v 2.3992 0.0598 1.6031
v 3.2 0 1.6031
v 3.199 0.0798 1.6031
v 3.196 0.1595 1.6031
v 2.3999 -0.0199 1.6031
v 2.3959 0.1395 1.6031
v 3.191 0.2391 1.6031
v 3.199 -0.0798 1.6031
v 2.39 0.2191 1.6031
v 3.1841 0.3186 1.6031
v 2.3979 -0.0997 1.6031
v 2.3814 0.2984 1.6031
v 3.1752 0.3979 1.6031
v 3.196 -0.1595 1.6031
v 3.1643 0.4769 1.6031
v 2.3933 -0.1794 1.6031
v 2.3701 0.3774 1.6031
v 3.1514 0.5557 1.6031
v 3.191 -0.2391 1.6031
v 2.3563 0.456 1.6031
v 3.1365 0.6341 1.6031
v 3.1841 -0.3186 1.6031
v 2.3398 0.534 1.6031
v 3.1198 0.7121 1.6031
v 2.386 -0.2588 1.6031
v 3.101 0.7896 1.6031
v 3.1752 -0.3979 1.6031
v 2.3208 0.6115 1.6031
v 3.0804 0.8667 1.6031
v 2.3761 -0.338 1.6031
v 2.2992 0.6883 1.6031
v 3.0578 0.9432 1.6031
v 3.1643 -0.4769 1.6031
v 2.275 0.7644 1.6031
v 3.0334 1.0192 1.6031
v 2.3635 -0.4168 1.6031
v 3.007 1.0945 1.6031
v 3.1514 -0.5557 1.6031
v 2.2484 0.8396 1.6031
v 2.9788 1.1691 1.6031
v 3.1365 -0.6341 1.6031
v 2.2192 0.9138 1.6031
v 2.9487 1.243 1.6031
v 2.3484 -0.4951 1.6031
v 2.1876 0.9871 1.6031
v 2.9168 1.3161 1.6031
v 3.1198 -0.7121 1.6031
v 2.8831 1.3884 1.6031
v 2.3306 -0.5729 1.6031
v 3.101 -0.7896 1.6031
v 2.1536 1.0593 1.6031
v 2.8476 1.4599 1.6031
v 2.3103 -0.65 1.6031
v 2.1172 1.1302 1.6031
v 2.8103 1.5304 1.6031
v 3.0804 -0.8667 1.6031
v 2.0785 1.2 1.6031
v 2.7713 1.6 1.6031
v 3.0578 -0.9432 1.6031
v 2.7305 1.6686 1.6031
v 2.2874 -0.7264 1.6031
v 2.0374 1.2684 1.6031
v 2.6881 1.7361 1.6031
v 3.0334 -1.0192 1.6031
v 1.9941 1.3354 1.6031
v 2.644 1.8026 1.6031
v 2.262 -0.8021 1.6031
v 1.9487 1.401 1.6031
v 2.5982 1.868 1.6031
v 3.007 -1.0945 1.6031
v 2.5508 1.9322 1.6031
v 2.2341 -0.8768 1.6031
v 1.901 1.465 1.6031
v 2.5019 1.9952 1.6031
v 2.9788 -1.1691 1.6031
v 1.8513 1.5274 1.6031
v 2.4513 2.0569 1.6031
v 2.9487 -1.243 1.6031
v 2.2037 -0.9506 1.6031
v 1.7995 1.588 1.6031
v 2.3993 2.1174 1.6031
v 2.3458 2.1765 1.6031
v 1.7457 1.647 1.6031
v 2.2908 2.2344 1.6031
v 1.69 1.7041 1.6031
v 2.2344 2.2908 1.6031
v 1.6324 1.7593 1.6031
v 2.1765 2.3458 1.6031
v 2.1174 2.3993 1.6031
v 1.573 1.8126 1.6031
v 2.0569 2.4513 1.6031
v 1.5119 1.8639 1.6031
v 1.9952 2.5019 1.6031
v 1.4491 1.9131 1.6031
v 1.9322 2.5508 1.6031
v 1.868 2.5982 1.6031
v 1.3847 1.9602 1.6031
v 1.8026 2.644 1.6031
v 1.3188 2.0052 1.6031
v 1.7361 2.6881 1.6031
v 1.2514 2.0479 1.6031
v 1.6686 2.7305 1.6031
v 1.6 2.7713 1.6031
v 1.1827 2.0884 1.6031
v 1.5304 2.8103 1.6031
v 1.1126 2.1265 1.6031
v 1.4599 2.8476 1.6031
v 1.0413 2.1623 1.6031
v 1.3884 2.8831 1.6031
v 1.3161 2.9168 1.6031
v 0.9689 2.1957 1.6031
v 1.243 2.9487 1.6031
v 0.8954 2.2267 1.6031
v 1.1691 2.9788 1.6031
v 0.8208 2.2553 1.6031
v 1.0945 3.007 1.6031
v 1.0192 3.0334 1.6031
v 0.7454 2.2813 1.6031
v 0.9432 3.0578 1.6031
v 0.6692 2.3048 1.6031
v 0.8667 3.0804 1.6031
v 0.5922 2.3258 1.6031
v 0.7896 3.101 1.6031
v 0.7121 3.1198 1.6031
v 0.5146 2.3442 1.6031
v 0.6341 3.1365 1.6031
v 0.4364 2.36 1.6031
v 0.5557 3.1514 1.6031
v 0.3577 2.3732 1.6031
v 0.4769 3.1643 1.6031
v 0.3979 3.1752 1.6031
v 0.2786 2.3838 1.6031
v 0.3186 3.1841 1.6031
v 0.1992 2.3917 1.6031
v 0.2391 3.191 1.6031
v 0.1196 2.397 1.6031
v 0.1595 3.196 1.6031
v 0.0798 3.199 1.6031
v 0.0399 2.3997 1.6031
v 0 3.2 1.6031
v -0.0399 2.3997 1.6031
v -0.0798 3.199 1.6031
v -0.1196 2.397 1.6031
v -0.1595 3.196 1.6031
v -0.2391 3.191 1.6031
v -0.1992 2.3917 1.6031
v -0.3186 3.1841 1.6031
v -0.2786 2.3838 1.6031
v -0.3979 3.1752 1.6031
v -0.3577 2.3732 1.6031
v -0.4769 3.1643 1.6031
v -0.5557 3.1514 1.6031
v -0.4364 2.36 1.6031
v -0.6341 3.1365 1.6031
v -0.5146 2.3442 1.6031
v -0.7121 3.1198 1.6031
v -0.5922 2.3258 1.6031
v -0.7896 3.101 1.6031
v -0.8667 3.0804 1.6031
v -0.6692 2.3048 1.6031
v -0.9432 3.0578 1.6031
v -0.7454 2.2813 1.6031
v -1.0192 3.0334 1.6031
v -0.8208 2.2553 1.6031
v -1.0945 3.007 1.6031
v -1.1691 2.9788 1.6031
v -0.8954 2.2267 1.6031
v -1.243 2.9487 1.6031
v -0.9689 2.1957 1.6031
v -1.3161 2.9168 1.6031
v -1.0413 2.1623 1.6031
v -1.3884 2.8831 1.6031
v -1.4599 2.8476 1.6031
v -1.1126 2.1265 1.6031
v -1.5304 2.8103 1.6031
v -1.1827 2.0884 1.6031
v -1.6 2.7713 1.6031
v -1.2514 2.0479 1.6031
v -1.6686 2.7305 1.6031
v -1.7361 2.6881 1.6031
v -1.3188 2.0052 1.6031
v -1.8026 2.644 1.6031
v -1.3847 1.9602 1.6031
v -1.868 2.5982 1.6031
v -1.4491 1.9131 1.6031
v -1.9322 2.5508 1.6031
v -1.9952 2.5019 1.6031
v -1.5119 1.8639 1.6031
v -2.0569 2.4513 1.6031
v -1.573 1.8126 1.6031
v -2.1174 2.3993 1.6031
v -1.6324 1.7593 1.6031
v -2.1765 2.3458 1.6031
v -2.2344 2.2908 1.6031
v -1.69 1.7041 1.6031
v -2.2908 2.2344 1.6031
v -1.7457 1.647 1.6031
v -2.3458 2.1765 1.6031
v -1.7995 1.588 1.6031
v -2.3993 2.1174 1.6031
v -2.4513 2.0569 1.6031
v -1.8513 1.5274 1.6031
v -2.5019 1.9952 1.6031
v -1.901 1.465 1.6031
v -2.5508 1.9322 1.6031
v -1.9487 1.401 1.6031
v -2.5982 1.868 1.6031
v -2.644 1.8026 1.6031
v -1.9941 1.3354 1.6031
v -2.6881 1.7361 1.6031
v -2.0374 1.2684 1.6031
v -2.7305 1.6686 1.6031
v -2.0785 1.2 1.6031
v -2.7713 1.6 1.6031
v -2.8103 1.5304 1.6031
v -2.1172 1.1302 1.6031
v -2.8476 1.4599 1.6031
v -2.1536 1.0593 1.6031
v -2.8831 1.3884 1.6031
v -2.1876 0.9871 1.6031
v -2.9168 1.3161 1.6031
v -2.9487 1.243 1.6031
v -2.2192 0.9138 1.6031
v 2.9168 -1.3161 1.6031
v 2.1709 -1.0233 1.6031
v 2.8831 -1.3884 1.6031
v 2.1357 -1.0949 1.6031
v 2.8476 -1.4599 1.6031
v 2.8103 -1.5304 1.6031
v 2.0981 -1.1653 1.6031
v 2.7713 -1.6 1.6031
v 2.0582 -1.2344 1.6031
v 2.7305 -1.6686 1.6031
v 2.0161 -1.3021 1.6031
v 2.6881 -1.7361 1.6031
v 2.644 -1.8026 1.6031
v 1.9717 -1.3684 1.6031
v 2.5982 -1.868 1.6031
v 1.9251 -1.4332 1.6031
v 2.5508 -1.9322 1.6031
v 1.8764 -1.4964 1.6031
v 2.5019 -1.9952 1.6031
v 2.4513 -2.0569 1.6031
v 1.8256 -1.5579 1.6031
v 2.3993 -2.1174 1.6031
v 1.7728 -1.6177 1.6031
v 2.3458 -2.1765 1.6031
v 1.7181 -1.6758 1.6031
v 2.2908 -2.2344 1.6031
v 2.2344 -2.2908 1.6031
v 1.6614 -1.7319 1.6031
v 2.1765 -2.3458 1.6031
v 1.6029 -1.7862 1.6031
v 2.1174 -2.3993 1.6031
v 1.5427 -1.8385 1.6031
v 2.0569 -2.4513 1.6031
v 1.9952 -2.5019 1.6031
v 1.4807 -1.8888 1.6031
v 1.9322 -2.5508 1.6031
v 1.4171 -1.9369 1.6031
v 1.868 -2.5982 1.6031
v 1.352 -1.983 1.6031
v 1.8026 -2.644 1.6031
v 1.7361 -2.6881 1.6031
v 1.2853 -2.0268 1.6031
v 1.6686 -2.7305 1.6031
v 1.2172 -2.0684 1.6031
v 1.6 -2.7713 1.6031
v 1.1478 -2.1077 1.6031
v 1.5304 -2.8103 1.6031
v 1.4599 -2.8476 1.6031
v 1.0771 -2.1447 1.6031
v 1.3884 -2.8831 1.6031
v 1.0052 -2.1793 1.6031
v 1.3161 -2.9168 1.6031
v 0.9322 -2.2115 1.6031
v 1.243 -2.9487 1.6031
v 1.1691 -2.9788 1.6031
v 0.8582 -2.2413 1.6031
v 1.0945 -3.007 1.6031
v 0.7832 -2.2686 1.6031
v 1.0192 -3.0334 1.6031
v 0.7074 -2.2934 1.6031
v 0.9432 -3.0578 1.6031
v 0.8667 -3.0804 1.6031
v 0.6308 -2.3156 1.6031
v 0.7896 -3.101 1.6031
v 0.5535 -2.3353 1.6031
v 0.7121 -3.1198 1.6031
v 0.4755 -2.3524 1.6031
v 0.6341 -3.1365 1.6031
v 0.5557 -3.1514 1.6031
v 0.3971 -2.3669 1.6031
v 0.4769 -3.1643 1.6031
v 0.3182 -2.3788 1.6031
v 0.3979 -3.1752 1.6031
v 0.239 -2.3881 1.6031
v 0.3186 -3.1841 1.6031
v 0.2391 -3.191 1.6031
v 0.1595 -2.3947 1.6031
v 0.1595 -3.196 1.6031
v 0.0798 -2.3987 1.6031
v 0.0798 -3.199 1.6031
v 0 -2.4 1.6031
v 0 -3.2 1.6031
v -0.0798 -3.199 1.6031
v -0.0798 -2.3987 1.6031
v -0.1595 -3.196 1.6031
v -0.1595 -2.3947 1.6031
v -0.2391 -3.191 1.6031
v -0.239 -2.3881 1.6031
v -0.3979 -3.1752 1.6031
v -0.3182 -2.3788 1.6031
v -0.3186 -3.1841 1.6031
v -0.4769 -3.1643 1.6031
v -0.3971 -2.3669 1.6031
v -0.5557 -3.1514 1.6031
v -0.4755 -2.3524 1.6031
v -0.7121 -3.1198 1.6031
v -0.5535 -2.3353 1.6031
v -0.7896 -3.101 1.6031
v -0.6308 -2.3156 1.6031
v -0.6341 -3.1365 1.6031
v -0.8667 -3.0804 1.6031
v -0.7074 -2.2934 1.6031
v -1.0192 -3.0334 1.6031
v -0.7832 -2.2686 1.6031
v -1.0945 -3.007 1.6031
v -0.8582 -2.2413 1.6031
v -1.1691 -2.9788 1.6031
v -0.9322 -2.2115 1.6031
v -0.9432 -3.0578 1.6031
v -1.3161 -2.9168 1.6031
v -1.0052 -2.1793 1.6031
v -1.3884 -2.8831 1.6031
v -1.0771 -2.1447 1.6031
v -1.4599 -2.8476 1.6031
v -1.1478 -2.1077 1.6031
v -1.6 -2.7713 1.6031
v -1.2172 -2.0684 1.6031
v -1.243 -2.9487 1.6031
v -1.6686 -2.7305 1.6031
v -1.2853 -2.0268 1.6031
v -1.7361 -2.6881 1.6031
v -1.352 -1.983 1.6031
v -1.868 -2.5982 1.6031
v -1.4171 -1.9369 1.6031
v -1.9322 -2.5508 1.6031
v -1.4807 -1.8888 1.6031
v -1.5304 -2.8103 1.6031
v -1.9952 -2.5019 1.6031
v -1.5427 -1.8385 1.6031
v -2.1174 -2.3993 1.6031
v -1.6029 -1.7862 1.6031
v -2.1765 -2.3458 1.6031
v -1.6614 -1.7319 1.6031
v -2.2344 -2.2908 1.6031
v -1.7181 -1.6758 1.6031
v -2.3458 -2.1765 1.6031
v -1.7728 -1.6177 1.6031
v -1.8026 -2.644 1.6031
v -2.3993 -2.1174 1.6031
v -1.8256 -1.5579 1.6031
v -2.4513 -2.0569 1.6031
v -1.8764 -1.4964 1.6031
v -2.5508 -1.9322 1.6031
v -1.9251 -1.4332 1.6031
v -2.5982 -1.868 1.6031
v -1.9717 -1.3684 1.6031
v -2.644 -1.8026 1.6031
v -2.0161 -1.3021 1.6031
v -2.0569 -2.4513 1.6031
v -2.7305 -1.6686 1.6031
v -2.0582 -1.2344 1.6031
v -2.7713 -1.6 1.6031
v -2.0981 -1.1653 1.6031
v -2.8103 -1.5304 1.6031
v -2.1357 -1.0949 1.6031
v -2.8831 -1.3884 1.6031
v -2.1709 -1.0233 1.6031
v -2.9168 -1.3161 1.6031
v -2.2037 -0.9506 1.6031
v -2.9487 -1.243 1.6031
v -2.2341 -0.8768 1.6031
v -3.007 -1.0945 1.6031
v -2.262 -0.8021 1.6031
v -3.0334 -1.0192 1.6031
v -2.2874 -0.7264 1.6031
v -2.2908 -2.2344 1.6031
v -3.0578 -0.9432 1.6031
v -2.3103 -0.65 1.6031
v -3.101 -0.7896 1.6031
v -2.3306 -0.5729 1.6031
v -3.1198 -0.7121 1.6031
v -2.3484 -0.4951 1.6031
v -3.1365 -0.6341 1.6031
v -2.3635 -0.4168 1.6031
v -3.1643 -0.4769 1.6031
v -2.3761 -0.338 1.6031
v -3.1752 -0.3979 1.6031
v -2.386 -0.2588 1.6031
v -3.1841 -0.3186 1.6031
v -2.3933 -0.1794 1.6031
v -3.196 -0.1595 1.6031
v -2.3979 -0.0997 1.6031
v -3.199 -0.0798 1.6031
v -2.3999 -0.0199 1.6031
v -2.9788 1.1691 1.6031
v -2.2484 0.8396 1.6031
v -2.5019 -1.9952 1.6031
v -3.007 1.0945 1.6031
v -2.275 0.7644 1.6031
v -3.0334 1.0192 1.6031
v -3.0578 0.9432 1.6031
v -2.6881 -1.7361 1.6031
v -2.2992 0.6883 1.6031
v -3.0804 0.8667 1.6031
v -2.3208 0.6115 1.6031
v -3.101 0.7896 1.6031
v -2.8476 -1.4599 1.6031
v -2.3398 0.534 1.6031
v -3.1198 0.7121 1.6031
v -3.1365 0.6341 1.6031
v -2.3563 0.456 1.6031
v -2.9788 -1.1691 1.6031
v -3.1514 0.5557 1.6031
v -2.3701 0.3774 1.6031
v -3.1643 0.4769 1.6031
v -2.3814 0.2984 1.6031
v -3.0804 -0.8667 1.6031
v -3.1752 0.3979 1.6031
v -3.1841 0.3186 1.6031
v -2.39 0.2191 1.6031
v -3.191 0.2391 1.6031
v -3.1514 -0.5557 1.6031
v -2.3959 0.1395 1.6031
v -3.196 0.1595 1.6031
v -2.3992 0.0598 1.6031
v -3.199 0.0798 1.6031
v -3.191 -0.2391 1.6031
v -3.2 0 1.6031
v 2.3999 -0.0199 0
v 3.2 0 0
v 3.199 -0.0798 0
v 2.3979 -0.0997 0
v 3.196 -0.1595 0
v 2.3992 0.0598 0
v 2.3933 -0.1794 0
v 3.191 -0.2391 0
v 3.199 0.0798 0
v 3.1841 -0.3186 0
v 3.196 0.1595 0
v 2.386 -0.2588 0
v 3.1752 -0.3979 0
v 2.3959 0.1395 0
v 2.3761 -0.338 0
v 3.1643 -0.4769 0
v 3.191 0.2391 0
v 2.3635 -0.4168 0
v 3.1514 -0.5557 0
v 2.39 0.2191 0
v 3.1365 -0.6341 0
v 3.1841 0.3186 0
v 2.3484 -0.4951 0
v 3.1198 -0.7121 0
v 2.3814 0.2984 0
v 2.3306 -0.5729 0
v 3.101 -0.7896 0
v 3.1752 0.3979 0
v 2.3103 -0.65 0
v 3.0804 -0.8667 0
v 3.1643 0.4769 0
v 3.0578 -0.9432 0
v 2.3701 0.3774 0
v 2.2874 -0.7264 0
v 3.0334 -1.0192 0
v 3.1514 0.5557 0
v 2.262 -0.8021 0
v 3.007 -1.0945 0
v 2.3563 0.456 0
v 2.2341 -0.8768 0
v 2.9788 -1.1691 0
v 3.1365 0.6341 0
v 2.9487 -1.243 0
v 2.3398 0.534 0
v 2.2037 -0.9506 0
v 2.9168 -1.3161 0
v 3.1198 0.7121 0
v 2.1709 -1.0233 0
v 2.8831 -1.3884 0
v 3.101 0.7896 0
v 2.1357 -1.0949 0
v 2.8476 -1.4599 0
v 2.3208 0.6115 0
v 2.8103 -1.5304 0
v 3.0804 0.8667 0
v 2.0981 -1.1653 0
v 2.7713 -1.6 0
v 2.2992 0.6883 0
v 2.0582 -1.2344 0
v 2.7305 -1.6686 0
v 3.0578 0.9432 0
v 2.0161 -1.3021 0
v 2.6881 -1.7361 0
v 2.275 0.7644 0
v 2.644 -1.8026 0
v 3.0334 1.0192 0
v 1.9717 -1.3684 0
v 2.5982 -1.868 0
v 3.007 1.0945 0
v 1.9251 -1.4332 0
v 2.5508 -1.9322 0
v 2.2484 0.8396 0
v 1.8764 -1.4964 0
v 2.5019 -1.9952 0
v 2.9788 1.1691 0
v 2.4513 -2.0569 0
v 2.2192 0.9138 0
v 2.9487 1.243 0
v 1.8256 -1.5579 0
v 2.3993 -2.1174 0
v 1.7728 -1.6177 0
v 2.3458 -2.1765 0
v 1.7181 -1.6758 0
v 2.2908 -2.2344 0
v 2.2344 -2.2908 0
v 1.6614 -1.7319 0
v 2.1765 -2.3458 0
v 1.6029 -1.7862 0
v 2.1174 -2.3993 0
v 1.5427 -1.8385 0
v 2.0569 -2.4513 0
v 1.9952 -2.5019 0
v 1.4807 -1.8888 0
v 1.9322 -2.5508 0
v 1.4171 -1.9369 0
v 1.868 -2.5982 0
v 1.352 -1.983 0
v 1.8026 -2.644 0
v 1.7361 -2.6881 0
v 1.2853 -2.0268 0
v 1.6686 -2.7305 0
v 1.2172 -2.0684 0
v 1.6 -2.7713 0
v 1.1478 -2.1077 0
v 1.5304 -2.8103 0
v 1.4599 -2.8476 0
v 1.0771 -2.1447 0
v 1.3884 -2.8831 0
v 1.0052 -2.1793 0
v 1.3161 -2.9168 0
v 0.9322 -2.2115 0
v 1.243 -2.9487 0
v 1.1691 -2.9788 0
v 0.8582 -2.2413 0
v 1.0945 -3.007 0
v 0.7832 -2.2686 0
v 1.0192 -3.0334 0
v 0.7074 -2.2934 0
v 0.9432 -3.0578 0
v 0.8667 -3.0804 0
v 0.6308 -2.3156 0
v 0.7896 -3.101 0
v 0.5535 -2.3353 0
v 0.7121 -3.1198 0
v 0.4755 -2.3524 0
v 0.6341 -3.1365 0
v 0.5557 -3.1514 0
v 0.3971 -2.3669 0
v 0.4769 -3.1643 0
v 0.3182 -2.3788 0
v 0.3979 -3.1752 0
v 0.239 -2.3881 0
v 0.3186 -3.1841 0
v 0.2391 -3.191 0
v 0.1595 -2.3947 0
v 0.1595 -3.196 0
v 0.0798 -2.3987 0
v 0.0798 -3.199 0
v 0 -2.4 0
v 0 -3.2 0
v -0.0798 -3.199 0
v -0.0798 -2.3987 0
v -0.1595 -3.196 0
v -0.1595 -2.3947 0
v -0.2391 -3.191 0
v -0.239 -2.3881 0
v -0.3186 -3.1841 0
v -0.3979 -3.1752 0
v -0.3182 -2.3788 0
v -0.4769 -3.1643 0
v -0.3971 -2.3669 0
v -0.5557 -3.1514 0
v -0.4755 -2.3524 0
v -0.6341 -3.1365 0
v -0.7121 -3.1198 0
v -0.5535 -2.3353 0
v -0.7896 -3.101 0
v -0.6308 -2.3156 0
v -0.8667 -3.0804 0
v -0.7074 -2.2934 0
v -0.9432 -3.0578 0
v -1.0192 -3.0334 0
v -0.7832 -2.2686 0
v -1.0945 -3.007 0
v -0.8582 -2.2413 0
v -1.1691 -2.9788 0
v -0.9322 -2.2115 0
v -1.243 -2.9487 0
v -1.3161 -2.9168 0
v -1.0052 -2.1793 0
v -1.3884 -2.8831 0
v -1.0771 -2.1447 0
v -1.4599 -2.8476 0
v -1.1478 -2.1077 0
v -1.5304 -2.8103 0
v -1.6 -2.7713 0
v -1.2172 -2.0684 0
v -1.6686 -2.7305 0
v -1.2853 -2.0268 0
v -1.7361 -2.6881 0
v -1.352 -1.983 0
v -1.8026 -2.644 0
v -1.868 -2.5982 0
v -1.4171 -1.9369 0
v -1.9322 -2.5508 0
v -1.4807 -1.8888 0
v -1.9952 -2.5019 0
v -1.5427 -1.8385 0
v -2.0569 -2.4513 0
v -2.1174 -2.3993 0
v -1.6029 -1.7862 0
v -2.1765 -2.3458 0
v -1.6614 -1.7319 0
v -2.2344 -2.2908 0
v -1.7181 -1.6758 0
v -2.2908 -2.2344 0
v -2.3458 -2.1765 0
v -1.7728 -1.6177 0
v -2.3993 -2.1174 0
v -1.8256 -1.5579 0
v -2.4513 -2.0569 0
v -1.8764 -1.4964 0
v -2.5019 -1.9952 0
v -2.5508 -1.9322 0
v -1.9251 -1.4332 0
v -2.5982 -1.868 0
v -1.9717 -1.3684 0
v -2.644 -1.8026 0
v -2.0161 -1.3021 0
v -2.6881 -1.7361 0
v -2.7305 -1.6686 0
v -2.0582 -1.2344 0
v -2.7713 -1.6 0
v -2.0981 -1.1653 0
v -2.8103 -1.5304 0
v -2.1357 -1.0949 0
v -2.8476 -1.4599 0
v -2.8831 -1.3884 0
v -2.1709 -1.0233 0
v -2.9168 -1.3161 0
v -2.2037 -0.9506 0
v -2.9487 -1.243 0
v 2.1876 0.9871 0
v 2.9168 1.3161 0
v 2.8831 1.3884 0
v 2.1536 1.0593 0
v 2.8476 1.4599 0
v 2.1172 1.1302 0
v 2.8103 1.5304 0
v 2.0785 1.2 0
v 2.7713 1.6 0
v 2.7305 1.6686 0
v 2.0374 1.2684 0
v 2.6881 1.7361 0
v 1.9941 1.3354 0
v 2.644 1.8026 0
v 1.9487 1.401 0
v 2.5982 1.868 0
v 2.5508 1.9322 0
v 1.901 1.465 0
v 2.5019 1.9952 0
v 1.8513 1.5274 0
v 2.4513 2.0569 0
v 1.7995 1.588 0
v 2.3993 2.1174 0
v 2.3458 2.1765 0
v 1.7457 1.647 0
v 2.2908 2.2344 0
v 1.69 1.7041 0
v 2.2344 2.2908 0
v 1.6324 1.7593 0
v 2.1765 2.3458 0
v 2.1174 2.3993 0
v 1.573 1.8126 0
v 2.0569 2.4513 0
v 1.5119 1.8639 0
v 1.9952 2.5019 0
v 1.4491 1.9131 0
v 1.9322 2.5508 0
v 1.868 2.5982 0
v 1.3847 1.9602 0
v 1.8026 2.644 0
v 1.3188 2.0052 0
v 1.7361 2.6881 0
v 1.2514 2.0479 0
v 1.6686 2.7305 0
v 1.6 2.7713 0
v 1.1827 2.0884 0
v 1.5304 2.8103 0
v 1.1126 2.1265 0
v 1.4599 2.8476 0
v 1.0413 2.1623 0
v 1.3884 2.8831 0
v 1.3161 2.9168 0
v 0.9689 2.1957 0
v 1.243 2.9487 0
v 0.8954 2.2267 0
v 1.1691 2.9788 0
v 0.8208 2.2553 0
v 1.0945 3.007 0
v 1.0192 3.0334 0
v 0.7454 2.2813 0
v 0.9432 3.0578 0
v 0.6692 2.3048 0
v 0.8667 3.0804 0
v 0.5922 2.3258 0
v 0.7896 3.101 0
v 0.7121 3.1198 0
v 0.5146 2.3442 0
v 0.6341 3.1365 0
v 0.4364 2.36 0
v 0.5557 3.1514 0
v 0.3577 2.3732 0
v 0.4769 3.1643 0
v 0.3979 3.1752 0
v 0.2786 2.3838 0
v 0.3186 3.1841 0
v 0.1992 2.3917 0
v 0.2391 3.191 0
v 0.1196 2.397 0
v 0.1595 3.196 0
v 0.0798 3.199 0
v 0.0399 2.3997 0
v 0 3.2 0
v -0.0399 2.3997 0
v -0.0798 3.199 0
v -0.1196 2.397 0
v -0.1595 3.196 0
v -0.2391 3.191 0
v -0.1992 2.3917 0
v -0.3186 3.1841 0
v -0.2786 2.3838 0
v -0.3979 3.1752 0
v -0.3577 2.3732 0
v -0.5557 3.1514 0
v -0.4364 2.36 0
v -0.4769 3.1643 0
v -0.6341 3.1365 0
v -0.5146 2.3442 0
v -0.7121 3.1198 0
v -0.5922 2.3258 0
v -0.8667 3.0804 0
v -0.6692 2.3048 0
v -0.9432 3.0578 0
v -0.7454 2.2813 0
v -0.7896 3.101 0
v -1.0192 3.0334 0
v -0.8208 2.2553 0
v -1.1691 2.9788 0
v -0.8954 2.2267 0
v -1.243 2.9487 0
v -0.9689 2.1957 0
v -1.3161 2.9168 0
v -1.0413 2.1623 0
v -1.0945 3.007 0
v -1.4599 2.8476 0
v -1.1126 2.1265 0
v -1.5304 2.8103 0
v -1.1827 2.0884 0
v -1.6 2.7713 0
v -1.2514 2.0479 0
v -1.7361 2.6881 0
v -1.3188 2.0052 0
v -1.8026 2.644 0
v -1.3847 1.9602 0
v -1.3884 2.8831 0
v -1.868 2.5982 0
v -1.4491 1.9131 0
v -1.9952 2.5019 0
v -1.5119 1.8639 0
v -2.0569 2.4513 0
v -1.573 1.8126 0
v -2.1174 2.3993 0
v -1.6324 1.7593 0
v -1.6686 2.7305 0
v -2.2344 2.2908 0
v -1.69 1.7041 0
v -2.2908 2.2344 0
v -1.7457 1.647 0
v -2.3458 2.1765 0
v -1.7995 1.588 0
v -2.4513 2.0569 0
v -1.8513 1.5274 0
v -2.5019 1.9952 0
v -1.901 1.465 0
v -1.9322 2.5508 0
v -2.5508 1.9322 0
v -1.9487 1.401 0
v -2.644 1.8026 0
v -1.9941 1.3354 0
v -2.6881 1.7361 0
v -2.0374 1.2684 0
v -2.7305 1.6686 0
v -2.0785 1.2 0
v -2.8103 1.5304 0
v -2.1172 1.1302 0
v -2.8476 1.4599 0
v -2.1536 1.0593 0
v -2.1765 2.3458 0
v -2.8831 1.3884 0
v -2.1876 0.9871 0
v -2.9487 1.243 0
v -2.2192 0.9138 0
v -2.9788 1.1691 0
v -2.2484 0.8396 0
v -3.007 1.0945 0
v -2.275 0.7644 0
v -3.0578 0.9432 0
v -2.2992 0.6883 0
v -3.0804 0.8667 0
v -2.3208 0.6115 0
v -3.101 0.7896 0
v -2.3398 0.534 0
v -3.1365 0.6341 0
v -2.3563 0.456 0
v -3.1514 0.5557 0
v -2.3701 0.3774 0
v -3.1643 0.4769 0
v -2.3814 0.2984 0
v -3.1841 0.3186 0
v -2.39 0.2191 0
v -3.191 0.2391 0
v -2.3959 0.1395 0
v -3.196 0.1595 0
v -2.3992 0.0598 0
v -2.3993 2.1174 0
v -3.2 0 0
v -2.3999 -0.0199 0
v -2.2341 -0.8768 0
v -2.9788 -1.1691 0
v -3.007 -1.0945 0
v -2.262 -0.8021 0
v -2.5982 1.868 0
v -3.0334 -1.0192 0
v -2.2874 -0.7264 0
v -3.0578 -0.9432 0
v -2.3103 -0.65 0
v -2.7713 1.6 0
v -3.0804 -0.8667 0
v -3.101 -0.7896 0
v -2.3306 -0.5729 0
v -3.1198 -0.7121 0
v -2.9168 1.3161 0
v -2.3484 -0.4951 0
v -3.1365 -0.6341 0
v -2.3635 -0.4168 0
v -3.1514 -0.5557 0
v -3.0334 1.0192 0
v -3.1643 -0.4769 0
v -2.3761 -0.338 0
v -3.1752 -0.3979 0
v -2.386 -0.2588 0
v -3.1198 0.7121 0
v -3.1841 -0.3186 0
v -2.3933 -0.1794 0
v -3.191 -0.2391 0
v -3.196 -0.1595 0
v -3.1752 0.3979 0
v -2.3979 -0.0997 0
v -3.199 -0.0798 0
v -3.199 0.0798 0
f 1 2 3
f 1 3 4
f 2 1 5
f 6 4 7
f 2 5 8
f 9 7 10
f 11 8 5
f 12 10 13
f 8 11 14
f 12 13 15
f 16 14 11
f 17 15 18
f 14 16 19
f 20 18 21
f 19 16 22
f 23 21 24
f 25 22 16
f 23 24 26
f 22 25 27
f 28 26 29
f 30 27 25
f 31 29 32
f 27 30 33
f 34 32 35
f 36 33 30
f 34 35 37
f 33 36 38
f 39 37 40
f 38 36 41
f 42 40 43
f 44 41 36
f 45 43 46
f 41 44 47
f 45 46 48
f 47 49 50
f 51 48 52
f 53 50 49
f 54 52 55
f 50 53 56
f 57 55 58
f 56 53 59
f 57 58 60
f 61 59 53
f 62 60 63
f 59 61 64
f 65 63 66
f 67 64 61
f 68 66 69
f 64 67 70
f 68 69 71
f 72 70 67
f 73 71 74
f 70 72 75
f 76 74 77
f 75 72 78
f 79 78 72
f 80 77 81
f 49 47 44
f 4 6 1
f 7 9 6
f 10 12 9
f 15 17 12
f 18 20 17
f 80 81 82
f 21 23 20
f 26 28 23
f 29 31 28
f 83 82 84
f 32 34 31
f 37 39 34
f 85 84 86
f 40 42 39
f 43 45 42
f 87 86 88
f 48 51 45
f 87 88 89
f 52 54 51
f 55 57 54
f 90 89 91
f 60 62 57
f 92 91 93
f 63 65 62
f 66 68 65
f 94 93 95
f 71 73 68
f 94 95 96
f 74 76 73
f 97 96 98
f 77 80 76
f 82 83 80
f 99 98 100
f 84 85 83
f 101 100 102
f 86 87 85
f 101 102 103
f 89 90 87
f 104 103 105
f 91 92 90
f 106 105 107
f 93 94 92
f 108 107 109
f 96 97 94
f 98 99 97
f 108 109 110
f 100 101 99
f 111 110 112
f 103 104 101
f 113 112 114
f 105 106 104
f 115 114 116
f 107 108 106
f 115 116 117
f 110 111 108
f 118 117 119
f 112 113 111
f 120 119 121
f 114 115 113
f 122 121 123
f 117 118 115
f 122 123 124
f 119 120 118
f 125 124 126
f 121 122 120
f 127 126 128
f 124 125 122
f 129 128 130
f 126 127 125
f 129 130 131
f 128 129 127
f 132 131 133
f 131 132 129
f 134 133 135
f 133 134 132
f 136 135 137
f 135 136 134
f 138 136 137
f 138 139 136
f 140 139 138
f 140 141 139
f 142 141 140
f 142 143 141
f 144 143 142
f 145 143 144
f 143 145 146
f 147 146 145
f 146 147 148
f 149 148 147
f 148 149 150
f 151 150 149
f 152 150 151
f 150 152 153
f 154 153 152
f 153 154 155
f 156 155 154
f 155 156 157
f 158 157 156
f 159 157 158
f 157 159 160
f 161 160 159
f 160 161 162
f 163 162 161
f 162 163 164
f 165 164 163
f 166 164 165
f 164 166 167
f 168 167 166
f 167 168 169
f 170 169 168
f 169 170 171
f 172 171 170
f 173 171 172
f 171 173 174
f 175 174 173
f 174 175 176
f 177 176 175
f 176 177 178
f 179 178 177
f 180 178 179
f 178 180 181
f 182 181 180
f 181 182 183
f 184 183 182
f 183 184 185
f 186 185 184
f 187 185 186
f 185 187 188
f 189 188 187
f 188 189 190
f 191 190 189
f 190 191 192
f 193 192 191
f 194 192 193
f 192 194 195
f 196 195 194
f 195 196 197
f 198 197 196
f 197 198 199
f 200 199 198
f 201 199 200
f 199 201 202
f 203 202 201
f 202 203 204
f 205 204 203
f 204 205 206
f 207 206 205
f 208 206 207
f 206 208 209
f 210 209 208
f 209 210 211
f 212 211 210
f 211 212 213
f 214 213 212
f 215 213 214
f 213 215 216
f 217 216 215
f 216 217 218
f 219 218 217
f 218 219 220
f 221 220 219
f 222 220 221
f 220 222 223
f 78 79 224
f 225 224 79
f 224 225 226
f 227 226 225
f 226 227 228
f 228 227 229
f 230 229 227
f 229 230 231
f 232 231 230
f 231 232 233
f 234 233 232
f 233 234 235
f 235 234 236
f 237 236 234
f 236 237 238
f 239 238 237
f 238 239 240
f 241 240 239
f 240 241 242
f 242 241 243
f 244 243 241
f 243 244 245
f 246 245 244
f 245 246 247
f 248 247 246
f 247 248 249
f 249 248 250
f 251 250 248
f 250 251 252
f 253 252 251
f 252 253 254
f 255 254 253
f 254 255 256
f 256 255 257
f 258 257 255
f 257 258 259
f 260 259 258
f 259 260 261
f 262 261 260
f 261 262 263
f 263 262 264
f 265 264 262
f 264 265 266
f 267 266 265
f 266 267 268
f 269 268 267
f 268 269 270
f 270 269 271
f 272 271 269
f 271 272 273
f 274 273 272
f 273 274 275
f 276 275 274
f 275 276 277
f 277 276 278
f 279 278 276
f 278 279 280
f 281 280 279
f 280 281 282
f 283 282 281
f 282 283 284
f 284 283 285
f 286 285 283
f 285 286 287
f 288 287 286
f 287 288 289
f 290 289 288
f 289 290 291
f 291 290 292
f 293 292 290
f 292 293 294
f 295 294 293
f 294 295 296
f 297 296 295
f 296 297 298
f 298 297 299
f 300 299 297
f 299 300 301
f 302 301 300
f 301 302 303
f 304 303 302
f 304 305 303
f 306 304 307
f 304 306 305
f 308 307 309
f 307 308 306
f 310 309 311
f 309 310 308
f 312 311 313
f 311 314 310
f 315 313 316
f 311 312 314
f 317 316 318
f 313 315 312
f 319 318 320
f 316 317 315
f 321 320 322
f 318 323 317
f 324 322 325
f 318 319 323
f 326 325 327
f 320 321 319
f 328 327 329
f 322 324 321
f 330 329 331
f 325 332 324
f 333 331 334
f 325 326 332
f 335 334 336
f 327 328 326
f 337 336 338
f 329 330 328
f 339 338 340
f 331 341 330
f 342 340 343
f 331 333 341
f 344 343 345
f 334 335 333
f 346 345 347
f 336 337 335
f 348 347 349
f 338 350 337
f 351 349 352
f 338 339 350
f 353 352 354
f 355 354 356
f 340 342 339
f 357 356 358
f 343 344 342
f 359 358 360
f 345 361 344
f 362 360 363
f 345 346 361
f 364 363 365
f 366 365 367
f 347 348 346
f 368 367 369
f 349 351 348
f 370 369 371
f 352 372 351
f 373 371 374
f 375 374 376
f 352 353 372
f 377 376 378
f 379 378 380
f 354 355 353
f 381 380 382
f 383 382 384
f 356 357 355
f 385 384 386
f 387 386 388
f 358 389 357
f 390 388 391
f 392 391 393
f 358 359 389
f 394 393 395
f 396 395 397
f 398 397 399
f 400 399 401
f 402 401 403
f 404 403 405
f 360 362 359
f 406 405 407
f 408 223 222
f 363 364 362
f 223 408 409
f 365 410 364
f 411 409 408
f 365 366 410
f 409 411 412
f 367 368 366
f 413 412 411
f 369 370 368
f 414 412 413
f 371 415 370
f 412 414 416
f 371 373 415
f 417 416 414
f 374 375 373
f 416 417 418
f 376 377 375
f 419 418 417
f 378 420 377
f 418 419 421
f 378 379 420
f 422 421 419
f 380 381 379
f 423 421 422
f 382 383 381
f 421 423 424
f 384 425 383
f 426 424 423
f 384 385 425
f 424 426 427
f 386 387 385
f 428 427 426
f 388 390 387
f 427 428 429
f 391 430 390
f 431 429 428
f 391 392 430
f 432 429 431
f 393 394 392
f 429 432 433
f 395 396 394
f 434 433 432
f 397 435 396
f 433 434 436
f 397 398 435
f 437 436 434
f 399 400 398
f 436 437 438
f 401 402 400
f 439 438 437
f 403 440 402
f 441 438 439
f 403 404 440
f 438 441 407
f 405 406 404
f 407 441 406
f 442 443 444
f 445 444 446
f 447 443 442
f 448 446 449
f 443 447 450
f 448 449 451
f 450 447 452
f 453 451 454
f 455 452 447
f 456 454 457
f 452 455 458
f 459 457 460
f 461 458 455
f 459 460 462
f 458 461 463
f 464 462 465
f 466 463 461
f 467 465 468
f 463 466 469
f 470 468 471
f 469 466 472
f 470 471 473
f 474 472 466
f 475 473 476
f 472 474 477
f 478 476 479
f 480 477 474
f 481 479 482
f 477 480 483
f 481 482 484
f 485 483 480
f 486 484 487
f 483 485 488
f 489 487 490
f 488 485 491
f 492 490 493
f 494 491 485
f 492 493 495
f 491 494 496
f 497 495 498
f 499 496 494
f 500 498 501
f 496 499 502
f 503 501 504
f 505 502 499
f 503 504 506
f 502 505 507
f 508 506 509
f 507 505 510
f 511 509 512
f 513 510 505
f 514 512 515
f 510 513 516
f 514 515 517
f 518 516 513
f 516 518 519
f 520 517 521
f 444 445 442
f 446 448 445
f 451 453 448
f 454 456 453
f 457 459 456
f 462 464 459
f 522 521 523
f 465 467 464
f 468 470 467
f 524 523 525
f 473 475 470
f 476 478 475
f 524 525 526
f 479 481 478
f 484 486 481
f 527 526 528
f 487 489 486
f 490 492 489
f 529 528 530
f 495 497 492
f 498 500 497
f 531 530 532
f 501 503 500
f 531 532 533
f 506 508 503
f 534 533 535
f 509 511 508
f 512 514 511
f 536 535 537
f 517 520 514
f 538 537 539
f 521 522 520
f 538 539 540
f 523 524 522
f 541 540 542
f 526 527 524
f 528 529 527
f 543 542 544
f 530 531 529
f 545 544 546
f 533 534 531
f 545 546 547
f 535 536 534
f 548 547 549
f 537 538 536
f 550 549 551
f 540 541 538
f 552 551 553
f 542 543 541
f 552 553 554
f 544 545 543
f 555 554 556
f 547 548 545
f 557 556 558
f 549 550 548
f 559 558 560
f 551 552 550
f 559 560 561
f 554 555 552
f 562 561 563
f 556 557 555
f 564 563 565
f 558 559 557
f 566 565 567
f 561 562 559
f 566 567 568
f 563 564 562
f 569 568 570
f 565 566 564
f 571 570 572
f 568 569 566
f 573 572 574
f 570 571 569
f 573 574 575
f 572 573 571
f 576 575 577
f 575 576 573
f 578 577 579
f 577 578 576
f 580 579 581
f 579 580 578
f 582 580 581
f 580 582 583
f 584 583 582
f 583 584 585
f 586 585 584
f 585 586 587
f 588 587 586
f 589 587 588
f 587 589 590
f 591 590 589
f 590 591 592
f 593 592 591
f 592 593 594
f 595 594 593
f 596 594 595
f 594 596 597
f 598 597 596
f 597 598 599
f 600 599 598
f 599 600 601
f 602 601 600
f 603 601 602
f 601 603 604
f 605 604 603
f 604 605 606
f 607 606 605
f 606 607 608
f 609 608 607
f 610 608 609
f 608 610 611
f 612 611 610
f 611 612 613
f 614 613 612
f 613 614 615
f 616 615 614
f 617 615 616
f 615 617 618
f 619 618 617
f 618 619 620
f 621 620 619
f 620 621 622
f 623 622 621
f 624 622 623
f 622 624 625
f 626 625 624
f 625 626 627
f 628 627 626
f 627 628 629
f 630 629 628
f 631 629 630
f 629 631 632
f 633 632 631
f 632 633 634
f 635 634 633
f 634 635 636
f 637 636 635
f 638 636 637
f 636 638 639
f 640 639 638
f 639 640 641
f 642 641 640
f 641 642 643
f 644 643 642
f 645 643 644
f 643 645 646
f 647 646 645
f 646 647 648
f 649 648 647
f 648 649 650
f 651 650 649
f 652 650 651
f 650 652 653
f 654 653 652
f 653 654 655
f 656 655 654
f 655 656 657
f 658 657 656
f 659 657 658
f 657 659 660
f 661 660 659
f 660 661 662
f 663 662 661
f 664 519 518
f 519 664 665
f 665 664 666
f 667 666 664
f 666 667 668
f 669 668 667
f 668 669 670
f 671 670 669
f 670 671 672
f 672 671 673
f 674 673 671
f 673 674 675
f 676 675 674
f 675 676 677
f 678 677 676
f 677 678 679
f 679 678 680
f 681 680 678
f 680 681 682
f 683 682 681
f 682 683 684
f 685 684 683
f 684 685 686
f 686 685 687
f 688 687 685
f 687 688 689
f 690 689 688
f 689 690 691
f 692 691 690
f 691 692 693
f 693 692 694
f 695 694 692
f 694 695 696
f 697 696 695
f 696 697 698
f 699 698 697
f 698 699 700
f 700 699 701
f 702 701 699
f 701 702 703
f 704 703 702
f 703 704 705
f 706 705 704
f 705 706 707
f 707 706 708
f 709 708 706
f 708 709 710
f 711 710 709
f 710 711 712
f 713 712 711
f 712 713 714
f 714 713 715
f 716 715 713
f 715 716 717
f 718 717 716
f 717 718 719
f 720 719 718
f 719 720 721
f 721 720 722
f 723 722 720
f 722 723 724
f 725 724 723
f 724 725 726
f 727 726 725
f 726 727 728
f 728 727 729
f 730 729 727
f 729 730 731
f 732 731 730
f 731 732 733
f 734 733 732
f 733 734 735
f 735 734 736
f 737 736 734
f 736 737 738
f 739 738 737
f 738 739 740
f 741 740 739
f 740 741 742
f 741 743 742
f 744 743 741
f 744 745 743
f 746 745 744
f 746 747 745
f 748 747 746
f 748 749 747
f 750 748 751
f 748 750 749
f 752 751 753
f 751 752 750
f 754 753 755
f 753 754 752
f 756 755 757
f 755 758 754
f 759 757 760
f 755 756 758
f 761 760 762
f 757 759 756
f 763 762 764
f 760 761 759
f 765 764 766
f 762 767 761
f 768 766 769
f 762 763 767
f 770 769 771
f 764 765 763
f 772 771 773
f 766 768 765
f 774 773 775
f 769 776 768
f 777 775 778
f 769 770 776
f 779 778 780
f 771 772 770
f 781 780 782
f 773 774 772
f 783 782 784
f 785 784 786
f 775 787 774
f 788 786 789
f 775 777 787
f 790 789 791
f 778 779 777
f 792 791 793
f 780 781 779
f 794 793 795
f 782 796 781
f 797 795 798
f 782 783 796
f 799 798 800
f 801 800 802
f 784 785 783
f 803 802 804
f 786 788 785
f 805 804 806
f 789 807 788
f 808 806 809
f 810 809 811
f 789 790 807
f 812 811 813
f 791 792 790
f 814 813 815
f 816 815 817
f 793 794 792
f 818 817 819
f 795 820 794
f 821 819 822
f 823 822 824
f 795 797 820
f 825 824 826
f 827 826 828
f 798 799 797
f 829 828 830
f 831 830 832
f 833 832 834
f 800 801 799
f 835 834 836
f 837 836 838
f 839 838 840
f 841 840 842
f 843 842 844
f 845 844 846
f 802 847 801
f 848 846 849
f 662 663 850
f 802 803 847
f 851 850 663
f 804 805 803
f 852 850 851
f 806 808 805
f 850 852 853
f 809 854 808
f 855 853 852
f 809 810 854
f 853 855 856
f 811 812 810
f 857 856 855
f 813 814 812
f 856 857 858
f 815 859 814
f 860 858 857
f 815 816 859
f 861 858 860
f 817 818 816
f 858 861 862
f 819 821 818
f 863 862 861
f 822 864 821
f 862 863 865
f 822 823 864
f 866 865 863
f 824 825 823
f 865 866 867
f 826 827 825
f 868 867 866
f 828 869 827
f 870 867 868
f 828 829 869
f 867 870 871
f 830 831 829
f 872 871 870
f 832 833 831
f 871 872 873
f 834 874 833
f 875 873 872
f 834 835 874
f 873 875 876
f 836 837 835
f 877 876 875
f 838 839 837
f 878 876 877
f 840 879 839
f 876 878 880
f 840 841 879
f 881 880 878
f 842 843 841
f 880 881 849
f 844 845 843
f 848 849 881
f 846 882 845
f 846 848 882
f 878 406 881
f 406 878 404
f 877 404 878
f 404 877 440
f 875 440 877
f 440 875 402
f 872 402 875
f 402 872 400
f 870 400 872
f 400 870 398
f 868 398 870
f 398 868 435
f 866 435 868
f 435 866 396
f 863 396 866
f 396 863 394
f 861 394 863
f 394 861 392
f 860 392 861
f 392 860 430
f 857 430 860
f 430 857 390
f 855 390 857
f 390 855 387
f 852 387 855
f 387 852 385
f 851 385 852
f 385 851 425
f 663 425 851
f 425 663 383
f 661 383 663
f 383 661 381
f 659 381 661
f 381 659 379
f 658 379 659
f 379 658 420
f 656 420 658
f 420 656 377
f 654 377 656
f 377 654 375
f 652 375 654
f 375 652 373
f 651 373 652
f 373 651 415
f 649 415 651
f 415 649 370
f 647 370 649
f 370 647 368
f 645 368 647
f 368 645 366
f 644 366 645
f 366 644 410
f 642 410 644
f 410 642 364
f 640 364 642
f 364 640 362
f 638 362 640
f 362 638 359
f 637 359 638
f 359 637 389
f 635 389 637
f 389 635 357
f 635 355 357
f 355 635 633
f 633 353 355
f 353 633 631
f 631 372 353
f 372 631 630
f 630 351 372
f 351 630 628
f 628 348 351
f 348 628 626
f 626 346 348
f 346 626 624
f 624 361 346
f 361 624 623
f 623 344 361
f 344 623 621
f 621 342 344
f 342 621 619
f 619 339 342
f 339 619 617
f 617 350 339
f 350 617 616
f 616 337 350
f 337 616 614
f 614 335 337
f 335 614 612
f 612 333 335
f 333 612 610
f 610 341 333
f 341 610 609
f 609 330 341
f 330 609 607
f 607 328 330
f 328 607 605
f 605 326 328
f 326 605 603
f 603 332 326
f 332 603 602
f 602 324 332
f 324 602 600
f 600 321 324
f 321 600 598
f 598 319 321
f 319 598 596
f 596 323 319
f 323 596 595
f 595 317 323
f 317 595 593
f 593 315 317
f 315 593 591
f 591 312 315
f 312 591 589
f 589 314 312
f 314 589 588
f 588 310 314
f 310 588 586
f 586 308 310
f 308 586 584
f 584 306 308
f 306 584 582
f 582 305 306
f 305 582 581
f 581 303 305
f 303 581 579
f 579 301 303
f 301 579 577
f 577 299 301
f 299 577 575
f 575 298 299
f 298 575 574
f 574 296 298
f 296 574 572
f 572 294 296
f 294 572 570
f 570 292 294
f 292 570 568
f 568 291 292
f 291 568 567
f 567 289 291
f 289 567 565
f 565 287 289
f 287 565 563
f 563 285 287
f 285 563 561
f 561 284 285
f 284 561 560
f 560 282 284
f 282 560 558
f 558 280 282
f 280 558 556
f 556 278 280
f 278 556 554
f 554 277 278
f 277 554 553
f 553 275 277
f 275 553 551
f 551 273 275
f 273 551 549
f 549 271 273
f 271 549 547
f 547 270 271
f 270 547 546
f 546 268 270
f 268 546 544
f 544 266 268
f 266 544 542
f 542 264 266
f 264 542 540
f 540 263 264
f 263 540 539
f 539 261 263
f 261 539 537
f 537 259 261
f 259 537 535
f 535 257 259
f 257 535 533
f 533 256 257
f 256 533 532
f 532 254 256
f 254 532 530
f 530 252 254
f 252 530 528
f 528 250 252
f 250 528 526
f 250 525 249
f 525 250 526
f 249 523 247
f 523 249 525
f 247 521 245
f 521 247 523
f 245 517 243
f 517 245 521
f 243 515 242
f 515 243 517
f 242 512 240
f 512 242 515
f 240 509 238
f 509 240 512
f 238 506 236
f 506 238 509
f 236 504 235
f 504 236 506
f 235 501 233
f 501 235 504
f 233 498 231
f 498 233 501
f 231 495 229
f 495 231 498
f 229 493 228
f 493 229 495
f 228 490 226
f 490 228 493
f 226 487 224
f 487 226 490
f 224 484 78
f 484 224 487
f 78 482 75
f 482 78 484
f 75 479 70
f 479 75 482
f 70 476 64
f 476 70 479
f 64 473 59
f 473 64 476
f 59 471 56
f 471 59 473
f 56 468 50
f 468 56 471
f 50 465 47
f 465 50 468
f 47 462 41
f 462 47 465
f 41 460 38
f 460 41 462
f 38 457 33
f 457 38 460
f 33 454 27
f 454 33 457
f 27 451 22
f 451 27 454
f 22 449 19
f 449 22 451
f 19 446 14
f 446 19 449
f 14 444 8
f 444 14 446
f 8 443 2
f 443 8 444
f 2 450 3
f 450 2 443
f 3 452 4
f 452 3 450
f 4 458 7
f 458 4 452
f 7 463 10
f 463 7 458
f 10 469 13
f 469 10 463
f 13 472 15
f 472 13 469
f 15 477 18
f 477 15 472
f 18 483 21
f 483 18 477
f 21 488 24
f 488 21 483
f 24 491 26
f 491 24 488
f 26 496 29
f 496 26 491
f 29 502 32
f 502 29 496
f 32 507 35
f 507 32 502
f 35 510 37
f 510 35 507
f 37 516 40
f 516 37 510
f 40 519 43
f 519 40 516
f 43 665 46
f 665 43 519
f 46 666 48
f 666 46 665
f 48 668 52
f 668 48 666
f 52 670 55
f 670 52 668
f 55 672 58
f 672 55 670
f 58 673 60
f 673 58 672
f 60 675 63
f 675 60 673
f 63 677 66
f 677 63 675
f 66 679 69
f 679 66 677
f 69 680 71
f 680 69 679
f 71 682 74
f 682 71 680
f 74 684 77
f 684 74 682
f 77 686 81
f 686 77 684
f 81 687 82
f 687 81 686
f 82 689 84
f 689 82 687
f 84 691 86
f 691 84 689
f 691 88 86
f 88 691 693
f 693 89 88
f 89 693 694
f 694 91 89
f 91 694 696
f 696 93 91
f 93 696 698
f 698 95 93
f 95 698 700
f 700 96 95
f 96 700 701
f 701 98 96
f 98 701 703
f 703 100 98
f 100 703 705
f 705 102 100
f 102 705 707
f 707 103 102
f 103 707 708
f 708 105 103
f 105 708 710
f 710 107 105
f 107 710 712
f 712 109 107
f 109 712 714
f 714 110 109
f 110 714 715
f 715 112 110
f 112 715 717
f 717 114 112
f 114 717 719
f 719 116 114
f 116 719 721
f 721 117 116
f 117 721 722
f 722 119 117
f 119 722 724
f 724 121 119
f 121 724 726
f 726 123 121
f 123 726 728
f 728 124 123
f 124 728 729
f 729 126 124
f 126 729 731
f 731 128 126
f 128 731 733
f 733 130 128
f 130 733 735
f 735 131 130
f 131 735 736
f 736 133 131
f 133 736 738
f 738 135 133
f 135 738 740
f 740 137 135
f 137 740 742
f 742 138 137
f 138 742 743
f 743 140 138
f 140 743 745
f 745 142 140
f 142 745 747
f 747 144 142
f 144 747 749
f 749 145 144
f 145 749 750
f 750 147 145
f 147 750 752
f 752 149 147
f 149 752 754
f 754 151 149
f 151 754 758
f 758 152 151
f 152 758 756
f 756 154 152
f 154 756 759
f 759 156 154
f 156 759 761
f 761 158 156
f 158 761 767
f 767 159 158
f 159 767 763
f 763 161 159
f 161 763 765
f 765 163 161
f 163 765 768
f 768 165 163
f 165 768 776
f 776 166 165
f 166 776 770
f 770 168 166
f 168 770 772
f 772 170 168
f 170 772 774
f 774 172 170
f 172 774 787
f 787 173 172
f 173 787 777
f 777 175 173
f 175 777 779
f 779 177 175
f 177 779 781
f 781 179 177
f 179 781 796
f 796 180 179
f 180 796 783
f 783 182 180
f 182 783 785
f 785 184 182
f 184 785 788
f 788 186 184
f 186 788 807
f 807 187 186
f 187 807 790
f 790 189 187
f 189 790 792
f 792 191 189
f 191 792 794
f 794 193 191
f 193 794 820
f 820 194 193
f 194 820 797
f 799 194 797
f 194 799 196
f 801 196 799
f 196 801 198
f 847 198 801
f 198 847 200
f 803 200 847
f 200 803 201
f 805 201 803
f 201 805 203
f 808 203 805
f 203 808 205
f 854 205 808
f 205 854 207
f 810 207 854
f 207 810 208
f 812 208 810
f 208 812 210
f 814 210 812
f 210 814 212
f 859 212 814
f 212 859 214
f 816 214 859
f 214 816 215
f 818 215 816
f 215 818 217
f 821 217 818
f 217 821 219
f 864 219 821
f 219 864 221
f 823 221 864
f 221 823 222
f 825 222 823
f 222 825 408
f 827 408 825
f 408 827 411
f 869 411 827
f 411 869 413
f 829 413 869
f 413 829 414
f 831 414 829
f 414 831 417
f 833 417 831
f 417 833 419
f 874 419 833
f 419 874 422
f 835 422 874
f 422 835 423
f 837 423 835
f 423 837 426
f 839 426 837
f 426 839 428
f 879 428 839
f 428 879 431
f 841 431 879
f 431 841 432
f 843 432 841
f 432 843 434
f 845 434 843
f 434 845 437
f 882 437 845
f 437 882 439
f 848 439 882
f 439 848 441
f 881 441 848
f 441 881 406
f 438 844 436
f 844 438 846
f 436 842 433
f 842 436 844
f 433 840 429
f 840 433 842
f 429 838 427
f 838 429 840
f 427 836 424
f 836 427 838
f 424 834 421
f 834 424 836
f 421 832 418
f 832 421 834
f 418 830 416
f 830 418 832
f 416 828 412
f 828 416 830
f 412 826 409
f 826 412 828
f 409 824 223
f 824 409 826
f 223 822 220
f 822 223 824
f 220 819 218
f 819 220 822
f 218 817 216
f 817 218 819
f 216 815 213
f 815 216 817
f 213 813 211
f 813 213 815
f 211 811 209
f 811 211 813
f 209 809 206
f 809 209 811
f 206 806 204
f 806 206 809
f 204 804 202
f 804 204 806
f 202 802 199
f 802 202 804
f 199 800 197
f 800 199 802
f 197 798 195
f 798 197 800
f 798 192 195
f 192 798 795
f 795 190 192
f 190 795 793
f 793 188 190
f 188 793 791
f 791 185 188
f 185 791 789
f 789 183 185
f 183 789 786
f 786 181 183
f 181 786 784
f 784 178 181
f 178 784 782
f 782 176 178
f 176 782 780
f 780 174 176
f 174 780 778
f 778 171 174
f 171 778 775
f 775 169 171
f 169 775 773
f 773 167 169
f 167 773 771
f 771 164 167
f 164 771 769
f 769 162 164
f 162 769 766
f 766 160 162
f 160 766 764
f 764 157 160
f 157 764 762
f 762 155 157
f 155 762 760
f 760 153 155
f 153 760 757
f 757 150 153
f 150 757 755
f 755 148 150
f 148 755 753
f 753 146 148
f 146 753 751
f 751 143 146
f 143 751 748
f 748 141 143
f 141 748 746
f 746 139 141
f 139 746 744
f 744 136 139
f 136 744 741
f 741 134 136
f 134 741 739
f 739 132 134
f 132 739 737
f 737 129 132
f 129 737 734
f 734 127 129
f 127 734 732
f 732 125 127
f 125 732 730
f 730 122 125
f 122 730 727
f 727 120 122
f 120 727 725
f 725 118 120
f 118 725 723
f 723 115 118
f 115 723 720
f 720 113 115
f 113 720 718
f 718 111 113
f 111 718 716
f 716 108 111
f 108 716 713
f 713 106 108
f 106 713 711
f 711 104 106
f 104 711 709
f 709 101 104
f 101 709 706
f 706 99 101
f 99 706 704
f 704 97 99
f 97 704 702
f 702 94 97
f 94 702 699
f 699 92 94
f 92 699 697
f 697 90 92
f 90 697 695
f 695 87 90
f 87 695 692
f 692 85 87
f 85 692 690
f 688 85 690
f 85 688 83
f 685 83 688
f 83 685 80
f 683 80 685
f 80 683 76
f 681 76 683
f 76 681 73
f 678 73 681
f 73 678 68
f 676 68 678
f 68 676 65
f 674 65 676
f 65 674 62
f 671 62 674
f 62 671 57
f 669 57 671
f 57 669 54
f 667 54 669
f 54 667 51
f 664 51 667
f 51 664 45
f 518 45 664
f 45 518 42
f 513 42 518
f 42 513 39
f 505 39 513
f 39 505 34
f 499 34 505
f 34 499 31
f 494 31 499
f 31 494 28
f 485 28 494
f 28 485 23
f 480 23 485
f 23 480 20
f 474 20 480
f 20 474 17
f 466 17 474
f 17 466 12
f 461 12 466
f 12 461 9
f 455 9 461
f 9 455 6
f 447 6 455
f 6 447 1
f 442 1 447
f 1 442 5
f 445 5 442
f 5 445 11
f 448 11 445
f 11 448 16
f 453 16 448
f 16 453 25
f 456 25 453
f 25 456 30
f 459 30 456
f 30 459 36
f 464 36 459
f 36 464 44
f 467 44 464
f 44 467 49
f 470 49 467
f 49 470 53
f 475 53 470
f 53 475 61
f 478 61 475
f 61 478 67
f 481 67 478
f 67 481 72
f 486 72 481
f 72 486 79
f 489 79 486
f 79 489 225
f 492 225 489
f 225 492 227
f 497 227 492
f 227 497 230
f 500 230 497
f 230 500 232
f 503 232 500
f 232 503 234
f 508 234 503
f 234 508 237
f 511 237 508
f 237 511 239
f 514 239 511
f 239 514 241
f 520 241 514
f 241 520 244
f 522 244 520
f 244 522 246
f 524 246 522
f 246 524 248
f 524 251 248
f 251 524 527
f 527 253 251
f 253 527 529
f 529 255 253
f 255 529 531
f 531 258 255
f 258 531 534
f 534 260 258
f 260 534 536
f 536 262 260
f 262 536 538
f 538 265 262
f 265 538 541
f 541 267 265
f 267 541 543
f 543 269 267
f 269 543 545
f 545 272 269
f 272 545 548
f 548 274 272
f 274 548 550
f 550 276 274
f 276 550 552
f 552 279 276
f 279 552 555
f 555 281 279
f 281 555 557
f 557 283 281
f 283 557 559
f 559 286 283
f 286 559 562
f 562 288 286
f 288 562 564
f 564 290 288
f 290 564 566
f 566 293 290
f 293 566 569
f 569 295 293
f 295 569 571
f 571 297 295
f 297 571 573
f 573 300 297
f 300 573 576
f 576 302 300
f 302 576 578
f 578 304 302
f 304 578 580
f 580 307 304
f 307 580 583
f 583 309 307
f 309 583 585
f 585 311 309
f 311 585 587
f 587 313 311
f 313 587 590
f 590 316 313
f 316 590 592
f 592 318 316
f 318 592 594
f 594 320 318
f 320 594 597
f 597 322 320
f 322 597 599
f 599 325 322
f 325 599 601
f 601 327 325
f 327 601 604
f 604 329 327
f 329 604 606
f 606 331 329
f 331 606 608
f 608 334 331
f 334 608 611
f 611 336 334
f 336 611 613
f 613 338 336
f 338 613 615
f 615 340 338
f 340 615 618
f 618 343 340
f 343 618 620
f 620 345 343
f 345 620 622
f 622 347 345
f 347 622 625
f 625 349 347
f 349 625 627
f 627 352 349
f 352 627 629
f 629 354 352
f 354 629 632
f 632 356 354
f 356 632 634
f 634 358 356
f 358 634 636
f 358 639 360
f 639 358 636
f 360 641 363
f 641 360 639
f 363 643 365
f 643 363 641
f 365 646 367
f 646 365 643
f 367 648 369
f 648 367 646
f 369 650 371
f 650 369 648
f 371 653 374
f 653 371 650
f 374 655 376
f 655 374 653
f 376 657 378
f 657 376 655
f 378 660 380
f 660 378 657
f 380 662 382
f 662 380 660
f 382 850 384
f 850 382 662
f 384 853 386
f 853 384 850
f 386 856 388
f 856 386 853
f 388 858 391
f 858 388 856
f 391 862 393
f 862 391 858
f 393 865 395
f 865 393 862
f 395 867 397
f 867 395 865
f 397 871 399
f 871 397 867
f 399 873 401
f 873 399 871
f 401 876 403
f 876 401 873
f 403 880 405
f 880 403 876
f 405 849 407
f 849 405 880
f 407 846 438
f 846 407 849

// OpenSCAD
use <../lib.scad>
use <6094.scad>
use <6095.scad>
use <70926.scad>
use <u9349p02.scad>
$fa=1; $fs=0.2;
function ldraw_lib__74948p02(realsolid=false) = [
// 0 Minifig Compass with White and Yellow Pattern
// 0 Name: 74948p02.dat
// 0 Author: Magnus Forsberg [MagFors]
// 0 !LDRAW_ORG Shortcut UPDATE 2022-06
// 0 !LICENSE Licensed under CC BY 2.0 and CC BY 4.0 : see CAreadme.txt
// 
// 0 BFC CERTIFY CCW
  [0,"BFC","CERTIFY"],
  [0,"BFC","CCW"],
// 
// 0 !CATEGORY Minifig Accessory
// 0 !KEYWORDS Aquanauts, Aquaraider, aquashark, Aquazone, Bricklink 70001pb01
// 0 !KEYWORDS Hydronauts, Stingray
// 
// 0 !HISTORY 2022-12-20 [PTadmin] Official Update 2022-06
// 
// 
// 1 47 0 0 0 1 0 0 0 1 0 0 0 1 6095.dat
  [1,47,0,0,0,1,0,0,0,1,0,0,0,1, ldraw_lib__6095(realsolid)],
// 1 494 0 0 0 1 0 0 0 1 0 0 0 1 70926.dat
  [1,494,0,0,0,1,0,0,0,1,0,0,0,1, ldraw_lib__70926(realsolid)],
// 1 16 0 0 0 1 0 0 0 1 0 0 0 1 6094.dat
  [1,16,0,0,0,1,0,0,0,1,0,0,0,1, ldraw_lib__6094(realsolid)],
// 1 0 0 0 0 1 0 0 0 1 0 0 0 1 u9349p02.dat
  [1,0,0,0,0,1,0,0,0,1,0,0,0,1, ldraw_lib__u9349p02(realsolid)],
];
module ldraw_lib__74948p02(step=0, col=false, unit=2/5, alt=false, line=0.2, solid=!$preview)
    makepoly(ldraw_lib__74948p02(solid), step=step, col=col, unit=unit, alt=alt, line=line, solid=solid);
ldraw_lib__74948p02(line=0.2);
